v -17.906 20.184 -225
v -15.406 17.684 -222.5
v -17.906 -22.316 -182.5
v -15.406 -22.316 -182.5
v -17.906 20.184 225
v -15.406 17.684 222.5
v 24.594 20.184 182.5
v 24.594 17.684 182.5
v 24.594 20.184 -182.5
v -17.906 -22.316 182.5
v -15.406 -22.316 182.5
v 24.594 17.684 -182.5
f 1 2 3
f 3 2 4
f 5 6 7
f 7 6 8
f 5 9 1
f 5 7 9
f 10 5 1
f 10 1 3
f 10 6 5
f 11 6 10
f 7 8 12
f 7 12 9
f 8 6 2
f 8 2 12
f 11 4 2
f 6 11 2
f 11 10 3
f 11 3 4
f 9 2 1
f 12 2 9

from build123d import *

# Parameters (mm, degrees)
BOSS_EXTRUDE1_DEPTH     = 225
CUT_EXTRUDE2_DEPTH      = 231.295675755
CUT_EXTRUDE2_DEPTH_BACK = 231.295675755
CUT_EXTRUDE3_DEPTH      = 231.06363453
CUT_EXTRUDE3_DEPTH_BACK = 231.06363453


with BuildPart() as part:
    # Sketch1 → Boss-Extrude1 (new, symmetric)
    with BuildSketch(Plane.XY):
        Polygon((-17.90633676, 20.183505355), (-17.90633676, -22.316494645), (-15.40633676, -22.316494645), (-15.40633676, 17.683505355), (24.59366324, 17.683505355), (24.59366324, 20.183505355), align=None)
    extrude(amount=BOSS_EXTRUDE1_DEPTH, both=True)

    # Sketch2 → Cut-Extrude2 (cut, two sides: drawn at the far end of the back side and taken through both)
    with BuildSketch(Plane(origin=(0, 20.183505355, 0), x_dir=(1, 0, 0), z_dir=(0, 1, 0)).offset(-CUT_EXTRUDE2_DEPTH_BACK)):
        Polygon((24.59366324, 182.5), (24.59366324, 225), (-17.90633676, 225), align=None)
        Polygon((24.59366324, -225), (-17.90633676, -225), (24.59366324, -182.5), align=None)
    extrude(amount=CUT_EXTRUDE2_DEPTH + CUT_EXTRUDE2_DEPTH_BACK, mode=Mode.SUBTRACT)

    # Sketch3 → Cut-Extrude3 (cut, two sides: drawn at the far end of the back side and taken through both)
    with BuildSketch(Plane.ZY.offset(17.90633676).offset(-CUT_EXTRUDE3_DEPTH_BACK)):
        Polygon((-225, 20.183505355), (-182.5, -22.316494645), (-225, -22.316494645), align=None)
        Polygon((182.5, -22.316494645), (225, -22.316494645), (225, 20.183505355), align=None)
    extrude(amount=CUT_EXTRUDE3_DEPTH + CUT_EXTRUDE3_DEPTH_BACK, mode=Mode.SUBTRACT)


solid = part.part
